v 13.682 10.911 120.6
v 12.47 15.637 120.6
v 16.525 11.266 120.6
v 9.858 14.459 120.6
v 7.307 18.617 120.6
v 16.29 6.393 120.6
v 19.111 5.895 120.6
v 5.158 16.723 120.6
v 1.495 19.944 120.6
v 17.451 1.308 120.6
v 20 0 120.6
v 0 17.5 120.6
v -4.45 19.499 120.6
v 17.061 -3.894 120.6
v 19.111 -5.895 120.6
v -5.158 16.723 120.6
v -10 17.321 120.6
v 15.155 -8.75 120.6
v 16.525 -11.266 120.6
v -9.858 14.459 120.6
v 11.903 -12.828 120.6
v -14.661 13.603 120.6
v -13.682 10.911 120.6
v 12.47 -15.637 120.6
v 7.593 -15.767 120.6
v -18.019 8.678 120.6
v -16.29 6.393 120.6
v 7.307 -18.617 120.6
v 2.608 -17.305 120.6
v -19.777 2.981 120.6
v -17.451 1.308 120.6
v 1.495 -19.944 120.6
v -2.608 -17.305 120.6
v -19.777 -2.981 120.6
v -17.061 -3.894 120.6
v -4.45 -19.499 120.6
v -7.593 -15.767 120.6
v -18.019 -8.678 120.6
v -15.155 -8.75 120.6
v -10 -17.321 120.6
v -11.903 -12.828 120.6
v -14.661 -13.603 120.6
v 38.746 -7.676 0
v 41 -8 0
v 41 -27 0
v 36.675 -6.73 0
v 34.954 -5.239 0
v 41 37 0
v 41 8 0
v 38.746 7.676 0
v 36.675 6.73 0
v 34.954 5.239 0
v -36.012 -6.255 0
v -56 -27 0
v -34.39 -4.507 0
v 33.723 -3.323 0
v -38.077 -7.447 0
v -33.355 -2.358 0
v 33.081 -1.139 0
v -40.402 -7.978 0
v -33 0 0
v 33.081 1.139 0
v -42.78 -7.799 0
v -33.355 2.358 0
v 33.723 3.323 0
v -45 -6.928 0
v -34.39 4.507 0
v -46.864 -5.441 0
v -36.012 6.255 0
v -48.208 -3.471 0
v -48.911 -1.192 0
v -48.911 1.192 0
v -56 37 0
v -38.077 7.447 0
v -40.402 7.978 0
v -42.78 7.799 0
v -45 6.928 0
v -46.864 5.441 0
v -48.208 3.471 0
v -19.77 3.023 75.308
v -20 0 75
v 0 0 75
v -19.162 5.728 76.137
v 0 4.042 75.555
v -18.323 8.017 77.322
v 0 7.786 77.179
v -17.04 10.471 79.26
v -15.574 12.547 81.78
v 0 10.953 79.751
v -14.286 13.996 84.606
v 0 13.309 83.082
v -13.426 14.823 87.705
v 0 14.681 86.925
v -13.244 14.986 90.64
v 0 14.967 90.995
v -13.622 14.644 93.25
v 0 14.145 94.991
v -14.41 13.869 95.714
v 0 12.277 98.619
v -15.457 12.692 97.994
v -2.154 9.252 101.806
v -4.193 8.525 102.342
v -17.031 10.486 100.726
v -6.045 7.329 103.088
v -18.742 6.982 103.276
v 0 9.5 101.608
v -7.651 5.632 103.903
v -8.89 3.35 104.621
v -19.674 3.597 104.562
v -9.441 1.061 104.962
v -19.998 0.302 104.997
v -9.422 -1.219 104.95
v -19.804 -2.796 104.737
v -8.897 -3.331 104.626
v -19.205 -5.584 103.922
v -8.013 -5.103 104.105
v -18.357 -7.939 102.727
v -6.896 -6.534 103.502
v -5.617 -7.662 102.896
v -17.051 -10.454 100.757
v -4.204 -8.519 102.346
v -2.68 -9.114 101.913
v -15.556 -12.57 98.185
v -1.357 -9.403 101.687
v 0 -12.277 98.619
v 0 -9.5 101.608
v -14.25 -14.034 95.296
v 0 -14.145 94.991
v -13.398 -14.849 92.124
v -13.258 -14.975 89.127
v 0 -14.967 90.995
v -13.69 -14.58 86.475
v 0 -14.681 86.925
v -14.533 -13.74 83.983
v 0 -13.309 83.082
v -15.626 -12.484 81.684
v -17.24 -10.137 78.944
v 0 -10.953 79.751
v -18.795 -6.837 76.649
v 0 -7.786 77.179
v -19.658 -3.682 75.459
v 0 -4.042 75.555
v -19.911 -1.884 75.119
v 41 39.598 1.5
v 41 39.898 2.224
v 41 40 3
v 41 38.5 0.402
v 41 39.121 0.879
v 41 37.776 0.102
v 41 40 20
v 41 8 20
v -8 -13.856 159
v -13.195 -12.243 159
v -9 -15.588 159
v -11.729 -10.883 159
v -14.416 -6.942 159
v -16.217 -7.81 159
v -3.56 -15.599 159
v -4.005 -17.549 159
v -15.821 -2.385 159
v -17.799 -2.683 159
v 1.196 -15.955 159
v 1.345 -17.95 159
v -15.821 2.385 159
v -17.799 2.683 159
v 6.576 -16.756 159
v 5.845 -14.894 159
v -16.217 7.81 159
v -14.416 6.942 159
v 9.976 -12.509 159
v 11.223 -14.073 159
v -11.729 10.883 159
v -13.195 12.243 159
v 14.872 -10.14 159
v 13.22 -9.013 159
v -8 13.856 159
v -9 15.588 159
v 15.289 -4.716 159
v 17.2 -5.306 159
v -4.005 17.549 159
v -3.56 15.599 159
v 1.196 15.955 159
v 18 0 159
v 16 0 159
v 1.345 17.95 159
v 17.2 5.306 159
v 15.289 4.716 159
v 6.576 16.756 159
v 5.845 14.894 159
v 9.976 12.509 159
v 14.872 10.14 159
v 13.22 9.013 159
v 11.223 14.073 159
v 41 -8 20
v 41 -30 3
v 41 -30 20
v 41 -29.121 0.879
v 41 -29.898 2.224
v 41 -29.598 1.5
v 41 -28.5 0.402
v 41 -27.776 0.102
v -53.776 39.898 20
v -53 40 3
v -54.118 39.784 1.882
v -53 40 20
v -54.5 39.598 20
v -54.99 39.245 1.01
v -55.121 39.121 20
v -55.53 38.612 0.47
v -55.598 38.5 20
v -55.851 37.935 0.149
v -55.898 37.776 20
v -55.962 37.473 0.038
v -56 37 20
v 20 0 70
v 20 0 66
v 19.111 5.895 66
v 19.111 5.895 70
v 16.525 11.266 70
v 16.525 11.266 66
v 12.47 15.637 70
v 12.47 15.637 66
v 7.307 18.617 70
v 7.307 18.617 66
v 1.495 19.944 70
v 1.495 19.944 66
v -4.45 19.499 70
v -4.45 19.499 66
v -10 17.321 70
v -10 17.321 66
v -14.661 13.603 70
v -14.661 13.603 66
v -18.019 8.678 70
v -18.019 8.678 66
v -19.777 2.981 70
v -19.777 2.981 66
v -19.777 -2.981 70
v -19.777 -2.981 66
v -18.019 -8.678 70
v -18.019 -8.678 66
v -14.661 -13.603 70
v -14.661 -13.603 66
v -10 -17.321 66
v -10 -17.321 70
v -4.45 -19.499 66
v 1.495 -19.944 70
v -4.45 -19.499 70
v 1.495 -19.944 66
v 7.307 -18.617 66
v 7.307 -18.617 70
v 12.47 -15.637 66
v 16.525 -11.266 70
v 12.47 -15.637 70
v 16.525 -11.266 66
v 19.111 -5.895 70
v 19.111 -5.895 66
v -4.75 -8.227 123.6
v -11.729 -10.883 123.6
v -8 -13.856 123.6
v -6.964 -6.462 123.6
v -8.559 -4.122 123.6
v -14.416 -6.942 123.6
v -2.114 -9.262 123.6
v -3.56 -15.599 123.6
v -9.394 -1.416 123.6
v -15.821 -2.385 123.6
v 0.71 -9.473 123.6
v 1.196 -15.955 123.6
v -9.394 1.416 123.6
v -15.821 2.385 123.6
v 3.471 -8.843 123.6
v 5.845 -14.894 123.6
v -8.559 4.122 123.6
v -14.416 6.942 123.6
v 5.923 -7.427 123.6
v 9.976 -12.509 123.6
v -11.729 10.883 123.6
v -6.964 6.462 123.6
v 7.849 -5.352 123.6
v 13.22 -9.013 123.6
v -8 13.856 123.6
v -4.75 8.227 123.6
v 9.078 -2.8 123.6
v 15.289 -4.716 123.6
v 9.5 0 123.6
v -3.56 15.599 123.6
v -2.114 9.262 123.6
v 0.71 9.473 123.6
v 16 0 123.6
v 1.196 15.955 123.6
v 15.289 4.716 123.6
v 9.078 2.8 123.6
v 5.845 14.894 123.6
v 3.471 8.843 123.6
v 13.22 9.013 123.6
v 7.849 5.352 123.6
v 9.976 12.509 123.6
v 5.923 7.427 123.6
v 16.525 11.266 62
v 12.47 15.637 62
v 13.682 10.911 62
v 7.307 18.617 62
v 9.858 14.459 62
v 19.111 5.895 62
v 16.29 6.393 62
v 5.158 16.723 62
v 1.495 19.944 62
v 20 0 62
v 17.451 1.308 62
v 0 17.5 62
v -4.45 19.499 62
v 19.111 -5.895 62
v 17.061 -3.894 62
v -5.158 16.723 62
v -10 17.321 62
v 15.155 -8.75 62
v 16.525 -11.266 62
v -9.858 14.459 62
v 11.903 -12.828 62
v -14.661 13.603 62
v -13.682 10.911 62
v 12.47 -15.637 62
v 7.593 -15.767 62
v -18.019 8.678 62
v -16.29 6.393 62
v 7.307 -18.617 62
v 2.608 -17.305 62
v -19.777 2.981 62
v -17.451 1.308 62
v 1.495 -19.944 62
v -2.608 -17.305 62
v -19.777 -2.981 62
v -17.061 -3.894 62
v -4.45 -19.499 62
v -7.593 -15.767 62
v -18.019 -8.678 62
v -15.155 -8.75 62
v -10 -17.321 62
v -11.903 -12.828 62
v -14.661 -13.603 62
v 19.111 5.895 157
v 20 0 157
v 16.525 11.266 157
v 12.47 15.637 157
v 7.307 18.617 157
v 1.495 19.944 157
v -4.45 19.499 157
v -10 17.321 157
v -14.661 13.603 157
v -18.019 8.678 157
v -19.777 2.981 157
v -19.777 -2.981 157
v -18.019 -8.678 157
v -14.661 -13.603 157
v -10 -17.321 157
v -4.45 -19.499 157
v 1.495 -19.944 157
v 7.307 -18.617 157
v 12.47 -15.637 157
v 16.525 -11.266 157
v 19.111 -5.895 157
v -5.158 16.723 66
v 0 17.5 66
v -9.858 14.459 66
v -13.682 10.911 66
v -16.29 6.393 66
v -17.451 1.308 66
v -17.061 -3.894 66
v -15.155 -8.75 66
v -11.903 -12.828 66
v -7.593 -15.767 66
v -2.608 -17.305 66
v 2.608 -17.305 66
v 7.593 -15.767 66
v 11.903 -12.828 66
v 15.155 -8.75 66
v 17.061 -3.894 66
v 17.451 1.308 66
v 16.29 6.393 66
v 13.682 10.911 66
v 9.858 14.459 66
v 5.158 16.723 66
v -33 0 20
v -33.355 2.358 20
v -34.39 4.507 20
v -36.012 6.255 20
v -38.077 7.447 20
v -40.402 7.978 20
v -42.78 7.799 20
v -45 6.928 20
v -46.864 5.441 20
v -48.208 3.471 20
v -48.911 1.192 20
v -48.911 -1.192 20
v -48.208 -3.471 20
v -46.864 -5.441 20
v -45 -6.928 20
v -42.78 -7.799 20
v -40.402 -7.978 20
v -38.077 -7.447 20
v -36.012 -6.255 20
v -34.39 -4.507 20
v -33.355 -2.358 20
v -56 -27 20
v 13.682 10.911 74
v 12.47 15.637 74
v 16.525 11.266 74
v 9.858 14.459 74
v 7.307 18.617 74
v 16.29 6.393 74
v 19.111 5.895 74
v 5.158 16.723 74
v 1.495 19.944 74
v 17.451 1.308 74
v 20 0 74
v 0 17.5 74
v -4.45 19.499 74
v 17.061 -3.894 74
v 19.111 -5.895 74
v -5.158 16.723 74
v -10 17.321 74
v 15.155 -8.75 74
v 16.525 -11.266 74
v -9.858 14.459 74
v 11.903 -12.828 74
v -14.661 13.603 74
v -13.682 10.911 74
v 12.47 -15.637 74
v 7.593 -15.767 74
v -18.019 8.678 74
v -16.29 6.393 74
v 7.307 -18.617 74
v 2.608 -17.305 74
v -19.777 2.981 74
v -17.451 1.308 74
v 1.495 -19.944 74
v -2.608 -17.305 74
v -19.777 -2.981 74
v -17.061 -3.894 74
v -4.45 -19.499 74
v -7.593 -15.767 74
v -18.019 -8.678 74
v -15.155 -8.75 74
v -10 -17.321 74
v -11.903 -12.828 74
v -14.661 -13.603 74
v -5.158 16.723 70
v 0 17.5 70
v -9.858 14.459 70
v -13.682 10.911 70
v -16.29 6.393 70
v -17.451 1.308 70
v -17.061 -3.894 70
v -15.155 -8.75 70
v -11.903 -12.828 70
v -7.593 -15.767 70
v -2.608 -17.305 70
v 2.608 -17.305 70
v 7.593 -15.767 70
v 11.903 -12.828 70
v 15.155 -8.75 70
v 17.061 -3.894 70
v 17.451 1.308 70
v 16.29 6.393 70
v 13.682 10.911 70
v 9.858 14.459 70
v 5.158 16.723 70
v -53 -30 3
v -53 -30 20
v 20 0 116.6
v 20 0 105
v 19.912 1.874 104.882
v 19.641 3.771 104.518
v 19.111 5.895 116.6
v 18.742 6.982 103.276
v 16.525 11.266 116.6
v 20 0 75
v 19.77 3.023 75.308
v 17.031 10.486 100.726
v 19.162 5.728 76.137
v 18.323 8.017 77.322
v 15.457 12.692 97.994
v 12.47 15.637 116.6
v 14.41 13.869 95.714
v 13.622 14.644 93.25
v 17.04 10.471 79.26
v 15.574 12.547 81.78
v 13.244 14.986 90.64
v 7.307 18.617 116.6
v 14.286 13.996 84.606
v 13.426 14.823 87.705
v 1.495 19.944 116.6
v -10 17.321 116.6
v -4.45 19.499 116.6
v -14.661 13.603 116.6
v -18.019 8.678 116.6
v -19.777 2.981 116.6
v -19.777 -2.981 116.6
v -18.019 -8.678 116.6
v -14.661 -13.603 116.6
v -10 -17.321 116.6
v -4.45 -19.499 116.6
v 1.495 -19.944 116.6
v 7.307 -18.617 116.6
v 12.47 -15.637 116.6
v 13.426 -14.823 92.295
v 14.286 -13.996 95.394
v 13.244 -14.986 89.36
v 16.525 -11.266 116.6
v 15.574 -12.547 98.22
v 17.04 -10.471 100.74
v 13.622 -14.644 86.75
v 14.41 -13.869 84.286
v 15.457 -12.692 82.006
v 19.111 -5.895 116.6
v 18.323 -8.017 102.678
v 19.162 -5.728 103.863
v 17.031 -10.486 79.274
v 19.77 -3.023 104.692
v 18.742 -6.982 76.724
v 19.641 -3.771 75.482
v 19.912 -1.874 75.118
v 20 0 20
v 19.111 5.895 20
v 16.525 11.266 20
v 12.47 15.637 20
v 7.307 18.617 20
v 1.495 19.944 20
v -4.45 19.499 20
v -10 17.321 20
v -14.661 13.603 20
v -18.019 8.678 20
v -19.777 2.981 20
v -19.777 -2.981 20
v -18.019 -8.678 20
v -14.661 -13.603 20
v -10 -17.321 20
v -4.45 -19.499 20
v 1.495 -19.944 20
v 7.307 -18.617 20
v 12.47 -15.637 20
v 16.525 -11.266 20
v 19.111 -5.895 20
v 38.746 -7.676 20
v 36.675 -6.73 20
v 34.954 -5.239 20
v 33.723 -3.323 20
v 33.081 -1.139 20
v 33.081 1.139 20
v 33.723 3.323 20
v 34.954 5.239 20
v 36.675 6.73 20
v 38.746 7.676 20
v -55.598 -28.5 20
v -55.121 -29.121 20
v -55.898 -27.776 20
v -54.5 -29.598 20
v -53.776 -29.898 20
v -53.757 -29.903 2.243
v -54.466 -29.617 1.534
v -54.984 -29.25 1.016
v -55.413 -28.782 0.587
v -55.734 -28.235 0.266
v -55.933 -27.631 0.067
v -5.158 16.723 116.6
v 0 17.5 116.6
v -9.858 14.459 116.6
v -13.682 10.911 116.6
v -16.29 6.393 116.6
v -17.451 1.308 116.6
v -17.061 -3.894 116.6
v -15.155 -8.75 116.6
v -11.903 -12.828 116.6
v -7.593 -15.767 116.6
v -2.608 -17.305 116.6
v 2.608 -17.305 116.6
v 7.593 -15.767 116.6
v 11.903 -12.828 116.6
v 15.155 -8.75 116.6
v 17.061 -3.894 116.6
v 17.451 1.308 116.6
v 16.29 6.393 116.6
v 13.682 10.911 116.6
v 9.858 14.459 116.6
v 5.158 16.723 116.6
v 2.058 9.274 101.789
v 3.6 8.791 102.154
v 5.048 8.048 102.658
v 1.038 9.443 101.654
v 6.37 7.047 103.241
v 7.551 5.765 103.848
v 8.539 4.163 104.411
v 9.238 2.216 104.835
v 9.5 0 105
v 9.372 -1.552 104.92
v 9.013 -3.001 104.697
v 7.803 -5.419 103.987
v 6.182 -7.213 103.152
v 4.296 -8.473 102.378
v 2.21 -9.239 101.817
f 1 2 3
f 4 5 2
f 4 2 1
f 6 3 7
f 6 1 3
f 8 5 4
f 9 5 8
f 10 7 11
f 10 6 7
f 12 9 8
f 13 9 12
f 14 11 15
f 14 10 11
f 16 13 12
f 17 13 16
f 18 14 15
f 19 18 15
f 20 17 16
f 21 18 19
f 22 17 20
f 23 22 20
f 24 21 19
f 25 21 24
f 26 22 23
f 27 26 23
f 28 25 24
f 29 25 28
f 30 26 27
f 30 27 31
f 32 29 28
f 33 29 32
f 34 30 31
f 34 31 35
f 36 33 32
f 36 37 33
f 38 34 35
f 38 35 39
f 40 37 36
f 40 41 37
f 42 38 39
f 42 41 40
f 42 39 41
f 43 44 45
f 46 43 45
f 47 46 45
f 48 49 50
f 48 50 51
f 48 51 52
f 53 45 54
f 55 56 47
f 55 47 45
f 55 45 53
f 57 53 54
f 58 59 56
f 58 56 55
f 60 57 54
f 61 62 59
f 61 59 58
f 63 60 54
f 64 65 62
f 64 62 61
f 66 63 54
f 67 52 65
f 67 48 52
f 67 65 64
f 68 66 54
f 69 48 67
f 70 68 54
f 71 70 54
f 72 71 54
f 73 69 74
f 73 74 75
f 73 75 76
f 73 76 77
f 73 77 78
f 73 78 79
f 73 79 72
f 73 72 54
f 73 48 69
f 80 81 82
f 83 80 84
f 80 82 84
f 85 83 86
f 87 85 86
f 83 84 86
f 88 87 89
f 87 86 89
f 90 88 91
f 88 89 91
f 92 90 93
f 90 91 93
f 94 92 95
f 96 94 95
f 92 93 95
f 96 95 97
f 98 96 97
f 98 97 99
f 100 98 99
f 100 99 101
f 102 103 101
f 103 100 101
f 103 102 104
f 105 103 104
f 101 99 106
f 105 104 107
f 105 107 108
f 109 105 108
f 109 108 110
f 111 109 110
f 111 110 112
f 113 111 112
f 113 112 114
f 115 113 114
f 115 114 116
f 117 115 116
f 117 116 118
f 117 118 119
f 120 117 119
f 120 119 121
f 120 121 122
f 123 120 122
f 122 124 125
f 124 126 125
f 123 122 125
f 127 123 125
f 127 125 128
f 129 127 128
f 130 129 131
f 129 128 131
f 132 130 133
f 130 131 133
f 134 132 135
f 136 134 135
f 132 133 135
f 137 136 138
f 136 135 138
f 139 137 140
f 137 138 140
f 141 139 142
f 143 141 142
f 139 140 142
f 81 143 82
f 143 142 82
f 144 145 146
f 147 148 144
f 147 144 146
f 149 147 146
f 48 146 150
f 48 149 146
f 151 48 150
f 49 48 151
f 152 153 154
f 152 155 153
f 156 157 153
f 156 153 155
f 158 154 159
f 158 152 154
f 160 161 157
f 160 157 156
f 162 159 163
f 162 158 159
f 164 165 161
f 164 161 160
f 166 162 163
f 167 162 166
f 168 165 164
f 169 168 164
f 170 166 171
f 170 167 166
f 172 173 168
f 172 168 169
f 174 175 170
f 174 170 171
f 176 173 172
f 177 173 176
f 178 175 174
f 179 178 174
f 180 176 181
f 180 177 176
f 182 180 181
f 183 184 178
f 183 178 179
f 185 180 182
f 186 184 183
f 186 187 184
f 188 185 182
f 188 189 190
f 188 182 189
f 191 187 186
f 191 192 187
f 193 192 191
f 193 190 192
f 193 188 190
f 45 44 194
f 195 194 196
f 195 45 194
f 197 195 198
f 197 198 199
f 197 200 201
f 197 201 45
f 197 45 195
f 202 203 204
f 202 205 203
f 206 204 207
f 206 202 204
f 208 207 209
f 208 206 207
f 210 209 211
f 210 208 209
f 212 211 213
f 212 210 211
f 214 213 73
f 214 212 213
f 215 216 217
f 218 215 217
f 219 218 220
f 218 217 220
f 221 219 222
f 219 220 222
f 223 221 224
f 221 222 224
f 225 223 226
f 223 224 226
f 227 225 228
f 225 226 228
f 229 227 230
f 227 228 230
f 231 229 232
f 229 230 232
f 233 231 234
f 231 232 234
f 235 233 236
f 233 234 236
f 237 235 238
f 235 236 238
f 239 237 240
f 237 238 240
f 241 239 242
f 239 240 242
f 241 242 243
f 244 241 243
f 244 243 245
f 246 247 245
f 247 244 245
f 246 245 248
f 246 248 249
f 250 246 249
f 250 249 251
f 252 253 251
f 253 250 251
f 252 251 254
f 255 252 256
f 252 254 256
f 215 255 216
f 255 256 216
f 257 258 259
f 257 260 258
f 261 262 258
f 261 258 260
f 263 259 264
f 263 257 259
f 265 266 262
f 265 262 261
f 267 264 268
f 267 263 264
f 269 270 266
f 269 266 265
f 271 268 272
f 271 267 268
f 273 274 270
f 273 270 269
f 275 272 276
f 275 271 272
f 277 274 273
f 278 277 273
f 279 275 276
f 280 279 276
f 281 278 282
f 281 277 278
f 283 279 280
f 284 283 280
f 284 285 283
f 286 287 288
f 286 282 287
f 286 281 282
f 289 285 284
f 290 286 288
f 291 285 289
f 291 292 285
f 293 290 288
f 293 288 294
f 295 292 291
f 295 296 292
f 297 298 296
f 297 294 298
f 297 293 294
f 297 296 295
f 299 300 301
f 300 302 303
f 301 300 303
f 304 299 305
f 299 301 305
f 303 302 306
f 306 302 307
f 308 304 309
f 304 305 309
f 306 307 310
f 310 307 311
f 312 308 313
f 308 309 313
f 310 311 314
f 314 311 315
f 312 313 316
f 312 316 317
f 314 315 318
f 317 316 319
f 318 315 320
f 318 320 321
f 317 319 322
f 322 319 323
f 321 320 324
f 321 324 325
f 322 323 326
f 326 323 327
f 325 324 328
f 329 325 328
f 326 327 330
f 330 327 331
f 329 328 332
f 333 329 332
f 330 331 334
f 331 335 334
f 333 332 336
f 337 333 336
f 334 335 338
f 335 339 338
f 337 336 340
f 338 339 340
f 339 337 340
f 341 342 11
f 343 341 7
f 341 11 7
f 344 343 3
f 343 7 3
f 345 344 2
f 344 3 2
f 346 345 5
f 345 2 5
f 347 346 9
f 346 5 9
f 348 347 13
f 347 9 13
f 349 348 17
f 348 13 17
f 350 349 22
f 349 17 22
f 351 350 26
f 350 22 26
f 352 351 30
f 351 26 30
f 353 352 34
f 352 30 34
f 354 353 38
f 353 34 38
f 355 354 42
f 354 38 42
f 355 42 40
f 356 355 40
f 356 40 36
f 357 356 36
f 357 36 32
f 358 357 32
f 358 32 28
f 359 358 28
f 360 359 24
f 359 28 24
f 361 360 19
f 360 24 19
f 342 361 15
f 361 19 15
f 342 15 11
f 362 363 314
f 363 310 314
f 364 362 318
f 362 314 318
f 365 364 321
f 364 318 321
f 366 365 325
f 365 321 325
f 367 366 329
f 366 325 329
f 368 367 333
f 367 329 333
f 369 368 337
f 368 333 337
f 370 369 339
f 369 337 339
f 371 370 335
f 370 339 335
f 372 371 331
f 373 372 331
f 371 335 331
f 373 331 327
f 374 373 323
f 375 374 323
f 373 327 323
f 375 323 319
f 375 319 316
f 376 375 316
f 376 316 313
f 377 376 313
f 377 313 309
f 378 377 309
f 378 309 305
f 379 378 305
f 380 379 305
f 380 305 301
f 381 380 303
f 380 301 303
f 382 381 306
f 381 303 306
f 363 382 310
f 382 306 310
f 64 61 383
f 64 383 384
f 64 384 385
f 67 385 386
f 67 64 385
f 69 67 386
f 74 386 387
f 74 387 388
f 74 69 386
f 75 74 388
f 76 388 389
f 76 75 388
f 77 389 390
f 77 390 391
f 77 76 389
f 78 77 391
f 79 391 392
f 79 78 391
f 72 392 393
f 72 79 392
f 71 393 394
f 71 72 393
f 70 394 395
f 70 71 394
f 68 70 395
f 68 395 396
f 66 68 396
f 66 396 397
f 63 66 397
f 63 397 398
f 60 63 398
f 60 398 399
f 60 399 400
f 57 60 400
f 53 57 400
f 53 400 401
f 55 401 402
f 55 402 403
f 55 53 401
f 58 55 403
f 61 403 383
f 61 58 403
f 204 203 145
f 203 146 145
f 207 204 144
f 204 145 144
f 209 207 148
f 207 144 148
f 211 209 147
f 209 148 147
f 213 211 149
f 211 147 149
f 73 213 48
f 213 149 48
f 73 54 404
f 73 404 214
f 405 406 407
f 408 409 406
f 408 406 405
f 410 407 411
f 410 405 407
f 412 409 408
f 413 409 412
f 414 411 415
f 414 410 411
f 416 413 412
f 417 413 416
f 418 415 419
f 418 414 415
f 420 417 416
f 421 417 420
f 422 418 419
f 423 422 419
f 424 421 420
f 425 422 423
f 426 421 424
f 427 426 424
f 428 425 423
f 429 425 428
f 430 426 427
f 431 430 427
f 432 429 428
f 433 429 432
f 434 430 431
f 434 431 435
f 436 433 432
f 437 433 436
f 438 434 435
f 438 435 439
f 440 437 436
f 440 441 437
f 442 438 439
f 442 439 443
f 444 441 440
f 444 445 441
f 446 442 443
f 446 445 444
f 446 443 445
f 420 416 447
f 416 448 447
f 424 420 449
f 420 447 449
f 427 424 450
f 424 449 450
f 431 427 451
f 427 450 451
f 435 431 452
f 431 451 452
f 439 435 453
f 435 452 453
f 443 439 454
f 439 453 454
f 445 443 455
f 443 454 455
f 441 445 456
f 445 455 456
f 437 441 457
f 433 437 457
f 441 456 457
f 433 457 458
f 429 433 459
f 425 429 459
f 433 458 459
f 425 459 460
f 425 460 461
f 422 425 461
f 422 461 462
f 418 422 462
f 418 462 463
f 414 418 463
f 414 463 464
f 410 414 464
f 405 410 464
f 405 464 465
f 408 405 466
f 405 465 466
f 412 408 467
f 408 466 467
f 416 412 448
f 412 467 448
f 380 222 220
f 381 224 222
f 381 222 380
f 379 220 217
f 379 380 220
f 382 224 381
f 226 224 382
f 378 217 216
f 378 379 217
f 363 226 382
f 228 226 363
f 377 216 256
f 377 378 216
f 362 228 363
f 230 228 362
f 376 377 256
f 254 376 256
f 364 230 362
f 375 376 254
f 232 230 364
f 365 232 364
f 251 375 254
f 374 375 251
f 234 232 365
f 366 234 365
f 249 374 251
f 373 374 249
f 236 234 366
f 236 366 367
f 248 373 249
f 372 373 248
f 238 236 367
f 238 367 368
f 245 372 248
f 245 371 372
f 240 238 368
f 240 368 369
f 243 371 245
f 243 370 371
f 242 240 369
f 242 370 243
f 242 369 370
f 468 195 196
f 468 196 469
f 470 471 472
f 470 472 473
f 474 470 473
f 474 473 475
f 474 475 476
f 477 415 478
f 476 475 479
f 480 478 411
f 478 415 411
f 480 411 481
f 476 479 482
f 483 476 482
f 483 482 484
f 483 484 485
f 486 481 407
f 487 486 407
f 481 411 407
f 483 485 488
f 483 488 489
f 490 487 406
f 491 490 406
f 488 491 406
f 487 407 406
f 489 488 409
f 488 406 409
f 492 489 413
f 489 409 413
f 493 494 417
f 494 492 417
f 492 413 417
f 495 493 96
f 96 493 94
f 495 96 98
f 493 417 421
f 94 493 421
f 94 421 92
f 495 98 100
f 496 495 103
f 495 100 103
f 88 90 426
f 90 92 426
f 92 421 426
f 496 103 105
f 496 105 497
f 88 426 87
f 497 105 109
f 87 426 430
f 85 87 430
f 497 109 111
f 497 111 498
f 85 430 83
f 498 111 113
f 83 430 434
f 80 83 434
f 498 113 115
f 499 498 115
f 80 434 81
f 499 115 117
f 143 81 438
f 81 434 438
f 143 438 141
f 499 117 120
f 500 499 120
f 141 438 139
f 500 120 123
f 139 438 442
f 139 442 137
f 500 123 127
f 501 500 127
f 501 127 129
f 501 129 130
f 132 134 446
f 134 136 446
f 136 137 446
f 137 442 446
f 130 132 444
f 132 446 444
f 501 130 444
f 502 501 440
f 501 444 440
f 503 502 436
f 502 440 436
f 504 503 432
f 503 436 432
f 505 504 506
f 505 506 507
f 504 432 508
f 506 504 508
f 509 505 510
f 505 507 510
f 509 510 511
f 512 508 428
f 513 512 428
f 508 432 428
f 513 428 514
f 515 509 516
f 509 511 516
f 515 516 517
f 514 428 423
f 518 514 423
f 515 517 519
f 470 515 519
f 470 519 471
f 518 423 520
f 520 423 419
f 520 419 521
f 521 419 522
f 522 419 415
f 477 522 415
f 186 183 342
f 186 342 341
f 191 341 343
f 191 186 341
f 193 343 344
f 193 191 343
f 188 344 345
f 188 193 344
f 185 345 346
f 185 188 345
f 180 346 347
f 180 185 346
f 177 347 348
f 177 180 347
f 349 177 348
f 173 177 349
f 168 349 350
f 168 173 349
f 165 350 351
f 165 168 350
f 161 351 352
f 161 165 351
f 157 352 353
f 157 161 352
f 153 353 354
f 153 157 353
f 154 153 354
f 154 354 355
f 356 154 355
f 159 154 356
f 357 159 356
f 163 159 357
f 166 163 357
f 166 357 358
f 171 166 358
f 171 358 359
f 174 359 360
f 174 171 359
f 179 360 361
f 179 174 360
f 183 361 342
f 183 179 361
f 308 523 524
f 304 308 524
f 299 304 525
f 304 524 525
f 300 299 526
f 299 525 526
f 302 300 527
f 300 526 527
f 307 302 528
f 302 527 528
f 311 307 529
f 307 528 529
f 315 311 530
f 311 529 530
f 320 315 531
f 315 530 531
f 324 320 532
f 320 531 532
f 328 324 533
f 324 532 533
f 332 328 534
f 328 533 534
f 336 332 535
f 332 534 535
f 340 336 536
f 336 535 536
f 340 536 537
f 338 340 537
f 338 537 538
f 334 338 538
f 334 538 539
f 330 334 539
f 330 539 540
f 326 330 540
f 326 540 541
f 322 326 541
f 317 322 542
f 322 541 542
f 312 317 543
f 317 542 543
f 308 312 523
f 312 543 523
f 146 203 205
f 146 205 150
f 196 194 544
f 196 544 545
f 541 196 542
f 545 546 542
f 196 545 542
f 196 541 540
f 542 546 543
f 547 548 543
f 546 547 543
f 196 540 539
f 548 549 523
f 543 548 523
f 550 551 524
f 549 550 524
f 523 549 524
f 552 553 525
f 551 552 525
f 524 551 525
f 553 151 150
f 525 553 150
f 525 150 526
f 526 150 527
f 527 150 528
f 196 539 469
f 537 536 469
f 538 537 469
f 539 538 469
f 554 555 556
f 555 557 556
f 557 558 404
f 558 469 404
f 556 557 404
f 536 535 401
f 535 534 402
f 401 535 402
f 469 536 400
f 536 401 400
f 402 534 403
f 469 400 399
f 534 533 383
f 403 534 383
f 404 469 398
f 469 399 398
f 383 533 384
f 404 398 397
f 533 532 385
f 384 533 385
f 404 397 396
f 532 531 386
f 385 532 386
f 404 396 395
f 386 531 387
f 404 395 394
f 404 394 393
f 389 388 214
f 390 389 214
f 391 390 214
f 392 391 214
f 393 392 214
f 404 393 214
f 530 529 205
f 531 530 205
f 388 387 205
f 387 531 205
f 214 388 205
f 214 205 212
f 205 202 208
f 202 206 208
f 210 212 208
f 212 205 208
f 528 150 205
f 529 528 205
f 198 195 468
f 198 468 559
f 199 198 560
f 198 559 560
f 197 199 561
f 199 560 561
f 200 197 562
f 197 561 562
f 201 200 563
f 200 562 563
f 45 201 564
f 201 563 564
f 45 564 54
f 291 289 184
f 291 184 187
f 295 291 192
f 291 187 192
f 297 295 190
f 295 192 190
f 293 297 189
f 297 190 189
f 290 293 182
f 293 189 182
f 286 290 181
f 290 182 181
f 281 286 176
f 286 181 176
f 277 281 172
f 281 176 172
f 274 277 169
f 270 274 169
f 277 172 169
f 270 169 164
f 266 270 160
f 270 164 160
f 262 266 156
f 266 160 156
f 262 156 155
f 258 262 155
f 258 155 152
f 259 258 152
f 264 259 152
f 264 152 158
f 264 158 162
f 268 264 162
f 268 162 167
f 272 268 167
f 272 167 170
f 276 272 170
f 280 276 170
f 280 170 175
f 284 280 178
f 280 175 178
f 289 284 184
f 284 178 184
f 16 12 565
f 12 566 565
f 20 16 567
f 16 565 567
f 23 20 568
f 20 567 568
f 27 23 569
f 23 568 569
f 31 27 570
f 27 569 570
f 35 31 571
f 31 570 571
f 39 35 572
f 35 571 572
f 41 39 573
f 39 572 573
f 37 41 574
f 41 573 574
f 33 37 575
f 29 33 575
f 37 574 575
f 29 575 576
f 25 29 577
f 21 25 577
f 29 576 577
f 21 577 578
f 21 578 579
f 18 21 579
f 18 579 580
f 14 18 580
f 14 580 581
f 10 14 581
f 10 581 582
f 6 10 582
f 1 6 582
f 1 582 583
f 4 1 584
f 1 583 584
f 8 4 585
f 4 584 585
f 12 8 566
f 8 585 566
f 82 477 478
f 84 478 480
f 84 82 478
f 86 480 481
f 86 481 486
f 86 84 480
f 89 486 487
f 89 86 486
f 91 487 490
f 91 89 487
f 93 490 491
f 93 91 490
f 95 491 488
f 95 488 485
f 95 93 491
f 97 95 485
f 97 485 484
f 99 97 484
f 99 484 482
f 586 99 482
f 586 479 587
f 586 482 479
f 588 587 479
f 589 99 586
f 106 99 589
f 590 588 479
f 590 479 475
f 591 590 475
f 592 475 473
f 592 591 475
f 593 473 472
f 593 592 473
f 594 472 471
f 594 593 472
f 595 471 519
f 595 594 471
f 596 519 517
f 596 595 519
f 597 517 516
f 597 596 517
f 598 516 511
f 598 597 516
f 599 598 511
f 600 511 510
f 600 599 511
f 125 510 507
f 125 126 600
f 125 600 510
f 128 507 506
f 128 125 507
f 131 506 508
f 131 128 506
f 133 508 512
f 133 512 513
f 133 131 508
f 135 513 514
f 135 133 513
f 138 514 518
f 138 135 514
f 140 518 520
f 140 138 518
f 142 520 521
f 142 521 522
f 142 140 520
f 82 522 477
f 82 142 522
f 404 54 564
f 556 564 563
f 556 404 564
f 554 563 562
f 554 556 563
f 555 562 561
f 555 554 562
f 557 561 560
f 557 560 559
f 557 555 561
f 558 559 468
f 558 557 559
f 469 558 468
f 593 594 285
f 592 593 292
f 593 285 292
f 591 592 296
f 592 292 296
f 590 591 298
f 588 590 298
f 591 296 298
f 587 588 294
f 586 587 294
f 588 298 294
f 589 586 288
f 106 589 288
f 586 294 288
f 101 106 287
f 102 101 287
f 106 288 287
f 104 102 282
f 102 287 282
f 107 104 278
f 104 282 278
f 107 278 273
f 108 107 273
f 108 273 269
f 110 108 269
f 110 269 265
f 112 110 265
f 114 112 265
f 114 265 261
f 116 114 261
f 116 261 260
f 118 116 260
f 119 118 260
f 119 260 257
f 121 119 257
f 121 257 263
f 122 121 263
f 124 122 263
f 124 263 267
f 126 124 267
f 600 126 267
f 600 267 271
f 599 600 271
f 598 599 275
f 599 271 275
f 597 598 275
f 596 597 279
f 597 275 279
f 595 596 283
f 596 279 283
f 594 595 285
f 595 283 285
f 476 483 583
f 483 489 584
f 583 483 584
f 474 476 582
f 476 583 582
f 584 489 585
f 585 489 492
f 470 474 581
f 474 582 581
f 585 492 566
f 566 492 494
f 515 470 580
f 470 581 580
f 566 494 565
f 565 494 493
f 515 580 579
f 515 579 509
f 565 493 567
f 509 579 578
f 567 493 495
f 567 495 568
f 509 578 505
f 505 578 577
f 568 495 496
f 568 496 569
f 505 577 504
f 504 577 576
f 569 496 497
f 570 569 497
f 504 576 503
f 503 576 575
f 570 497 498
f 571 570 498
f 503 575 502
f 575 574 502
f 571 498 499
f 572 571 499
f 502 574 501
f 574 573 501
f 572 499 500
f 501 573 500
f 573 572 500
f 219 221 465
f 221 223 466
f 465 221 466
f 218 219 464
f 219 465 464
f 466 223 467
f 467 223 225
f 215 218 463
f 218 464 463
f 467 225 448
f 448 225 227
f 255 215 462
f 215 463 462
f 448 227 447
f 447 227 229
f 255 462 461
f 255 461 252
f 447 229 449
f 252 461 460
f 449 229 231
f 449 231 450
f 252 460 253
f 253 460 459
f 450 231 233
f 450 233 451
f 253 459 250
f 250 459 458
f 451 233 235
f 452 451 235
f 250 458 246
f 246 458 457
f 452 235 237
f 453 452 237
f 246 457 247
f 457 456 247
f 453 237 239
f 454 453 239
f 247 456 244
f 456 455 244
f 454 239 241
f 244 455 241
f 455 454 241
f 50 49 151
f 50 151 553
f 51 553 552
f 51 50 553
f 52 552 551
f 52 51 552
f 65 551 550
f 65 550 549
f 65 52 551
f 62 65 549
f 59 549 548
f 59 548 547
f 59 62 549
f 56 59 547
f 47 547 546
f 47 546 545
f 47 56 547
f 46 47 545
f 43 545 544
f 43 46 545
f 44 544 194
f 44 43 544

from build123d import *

# Parameters (mm, degrees)
SKETCH1_R               = 8
BOSS_EXTRUDE1_DEPTH     = 20
SKETCH2_R               = 20
BOSS_EXTRUDE2_DEPTH     = 139
SKETCH3_R               = 15
CUT_EXTRUDE1_DEPTH      = 42
CUT_EXTRUDE1_DEPTH_BACK = 57
SKETCH4_W               = 4
SKETCH4_H               = 2.5
SKETCH5_R               = 16
CUT_EXTRUDE2_DEPTH      = 35.4
SKETCH6_R               = 9.5
CUT_EXTRUDE3_DEPTH      = 22
CHAMFER1_SIZE           = 2
FILLET1_R               = 3


with BuildPart() as part:
    # Sketch1 → Boss-Extrude1 (new body)
    with BuildSketch(Plane.XY):
        with BuildLine():
            Line((-56, 40), (41, 40))
            Line((41, 40), (41, 8))
            ThreePointArc((41, 8), (33, 0), (41, -8))
            Line((41, -8), (41, -30))
            Line((41, -30), (-56, -30))
            Line((-56, -30), (-56, 40))
        make_face()
        with Locations((-41, 0)):
            Circle(SKETCH1_R, mode=Mode.SUBTRACT)
    extrude(amount=BOSS_EXTRUDE1_DEPTH)

    # Sketch2 → Boss-Extrude2 (add)
    with BuildSketch(Plane.XY.offset(20)):
        Circle(SKETCH2_R)
    extrude(amount=BOSS_EXTRUDE2_DEPTH)

    # Sketch3 → Cut-Extrude1 (cut, two sides)
    with BuildSketch(Plane(origin=(0, 0, 0), x_dir=(0, 0, -1), z_dir=(1, 0, 0))) as cut_extrude1_sk:
        with Locations((-90, 0)):
            Circle(SKETCH3_R)
    extrude(amount=CUT_EXTRUDE1_DEPTH, mode=Mode.SUBTRACT)
    extrude(cut_extrude1_sk.sketch, amount=-CUT_EXTRUDE1_DEPTH_BACK, mode=Mode.SUBTRACT)

    # Sketch4 → Cut-Revolve1 (revolve, cut)
    with BuildSketch(Plane(origin=(0, 0, 0), x_dir=(0, 0, -1), z_dir=(1, 0, 0))):
        with Locations((-64, 18.75)):
            Rectangle(SKETCH4_W, SKETCH4_H)
        with Locations((-72, 18.75)):
            Rectangle(SKETCH4_W, SKETCH4_H)
        with Locations((-118.6, 18.75)):
            Rectangle(SKETCH4_W, SKETCH4_H)
    revolve(axis=Axis((0, 0, 0), (0, 0, 1)), mode=Mode.SUBTRACT)

    # Sketch5 → Cut-Extrude2 (cut)
    with BuildSketch(Plane.XY.offset(159)):
        Circle(SKETCH5_R)
    extrude(amount=-CUT_EXTRUDE2_DEPTH, mode=Mode.SUBTRACT)

    # Sketch6 → Cut-Extrude3 (cut)
    with BuildSketch(Plane.XY.offset(123.6)):
        Circle(SKETCH6_R)
    extrude(amount=-CUT_EXTRUDE3_DEPTH, mode=Mode.SUBTRACT)

    # Chamfer1
    chamfer1_edges = [part.edges().sort_by_distance(p)[0] for p in [
        (-20, 0, 159),
    ]]
    chamfer(chamfer1_edges, length=CHAMFER1_SIZE)

    # Fillet1
    fillet1_edges = [part.edges().sort_by_distance(p)[0] for p in [
        (-56, 40, 10),
        (-56, -30, 10),
        (-7.5, 40, 0),
        (-7.5, -30, 0),
    ]]
    fillet(fillet1_edges, radius=FILLET1_R)


solid = part.part
